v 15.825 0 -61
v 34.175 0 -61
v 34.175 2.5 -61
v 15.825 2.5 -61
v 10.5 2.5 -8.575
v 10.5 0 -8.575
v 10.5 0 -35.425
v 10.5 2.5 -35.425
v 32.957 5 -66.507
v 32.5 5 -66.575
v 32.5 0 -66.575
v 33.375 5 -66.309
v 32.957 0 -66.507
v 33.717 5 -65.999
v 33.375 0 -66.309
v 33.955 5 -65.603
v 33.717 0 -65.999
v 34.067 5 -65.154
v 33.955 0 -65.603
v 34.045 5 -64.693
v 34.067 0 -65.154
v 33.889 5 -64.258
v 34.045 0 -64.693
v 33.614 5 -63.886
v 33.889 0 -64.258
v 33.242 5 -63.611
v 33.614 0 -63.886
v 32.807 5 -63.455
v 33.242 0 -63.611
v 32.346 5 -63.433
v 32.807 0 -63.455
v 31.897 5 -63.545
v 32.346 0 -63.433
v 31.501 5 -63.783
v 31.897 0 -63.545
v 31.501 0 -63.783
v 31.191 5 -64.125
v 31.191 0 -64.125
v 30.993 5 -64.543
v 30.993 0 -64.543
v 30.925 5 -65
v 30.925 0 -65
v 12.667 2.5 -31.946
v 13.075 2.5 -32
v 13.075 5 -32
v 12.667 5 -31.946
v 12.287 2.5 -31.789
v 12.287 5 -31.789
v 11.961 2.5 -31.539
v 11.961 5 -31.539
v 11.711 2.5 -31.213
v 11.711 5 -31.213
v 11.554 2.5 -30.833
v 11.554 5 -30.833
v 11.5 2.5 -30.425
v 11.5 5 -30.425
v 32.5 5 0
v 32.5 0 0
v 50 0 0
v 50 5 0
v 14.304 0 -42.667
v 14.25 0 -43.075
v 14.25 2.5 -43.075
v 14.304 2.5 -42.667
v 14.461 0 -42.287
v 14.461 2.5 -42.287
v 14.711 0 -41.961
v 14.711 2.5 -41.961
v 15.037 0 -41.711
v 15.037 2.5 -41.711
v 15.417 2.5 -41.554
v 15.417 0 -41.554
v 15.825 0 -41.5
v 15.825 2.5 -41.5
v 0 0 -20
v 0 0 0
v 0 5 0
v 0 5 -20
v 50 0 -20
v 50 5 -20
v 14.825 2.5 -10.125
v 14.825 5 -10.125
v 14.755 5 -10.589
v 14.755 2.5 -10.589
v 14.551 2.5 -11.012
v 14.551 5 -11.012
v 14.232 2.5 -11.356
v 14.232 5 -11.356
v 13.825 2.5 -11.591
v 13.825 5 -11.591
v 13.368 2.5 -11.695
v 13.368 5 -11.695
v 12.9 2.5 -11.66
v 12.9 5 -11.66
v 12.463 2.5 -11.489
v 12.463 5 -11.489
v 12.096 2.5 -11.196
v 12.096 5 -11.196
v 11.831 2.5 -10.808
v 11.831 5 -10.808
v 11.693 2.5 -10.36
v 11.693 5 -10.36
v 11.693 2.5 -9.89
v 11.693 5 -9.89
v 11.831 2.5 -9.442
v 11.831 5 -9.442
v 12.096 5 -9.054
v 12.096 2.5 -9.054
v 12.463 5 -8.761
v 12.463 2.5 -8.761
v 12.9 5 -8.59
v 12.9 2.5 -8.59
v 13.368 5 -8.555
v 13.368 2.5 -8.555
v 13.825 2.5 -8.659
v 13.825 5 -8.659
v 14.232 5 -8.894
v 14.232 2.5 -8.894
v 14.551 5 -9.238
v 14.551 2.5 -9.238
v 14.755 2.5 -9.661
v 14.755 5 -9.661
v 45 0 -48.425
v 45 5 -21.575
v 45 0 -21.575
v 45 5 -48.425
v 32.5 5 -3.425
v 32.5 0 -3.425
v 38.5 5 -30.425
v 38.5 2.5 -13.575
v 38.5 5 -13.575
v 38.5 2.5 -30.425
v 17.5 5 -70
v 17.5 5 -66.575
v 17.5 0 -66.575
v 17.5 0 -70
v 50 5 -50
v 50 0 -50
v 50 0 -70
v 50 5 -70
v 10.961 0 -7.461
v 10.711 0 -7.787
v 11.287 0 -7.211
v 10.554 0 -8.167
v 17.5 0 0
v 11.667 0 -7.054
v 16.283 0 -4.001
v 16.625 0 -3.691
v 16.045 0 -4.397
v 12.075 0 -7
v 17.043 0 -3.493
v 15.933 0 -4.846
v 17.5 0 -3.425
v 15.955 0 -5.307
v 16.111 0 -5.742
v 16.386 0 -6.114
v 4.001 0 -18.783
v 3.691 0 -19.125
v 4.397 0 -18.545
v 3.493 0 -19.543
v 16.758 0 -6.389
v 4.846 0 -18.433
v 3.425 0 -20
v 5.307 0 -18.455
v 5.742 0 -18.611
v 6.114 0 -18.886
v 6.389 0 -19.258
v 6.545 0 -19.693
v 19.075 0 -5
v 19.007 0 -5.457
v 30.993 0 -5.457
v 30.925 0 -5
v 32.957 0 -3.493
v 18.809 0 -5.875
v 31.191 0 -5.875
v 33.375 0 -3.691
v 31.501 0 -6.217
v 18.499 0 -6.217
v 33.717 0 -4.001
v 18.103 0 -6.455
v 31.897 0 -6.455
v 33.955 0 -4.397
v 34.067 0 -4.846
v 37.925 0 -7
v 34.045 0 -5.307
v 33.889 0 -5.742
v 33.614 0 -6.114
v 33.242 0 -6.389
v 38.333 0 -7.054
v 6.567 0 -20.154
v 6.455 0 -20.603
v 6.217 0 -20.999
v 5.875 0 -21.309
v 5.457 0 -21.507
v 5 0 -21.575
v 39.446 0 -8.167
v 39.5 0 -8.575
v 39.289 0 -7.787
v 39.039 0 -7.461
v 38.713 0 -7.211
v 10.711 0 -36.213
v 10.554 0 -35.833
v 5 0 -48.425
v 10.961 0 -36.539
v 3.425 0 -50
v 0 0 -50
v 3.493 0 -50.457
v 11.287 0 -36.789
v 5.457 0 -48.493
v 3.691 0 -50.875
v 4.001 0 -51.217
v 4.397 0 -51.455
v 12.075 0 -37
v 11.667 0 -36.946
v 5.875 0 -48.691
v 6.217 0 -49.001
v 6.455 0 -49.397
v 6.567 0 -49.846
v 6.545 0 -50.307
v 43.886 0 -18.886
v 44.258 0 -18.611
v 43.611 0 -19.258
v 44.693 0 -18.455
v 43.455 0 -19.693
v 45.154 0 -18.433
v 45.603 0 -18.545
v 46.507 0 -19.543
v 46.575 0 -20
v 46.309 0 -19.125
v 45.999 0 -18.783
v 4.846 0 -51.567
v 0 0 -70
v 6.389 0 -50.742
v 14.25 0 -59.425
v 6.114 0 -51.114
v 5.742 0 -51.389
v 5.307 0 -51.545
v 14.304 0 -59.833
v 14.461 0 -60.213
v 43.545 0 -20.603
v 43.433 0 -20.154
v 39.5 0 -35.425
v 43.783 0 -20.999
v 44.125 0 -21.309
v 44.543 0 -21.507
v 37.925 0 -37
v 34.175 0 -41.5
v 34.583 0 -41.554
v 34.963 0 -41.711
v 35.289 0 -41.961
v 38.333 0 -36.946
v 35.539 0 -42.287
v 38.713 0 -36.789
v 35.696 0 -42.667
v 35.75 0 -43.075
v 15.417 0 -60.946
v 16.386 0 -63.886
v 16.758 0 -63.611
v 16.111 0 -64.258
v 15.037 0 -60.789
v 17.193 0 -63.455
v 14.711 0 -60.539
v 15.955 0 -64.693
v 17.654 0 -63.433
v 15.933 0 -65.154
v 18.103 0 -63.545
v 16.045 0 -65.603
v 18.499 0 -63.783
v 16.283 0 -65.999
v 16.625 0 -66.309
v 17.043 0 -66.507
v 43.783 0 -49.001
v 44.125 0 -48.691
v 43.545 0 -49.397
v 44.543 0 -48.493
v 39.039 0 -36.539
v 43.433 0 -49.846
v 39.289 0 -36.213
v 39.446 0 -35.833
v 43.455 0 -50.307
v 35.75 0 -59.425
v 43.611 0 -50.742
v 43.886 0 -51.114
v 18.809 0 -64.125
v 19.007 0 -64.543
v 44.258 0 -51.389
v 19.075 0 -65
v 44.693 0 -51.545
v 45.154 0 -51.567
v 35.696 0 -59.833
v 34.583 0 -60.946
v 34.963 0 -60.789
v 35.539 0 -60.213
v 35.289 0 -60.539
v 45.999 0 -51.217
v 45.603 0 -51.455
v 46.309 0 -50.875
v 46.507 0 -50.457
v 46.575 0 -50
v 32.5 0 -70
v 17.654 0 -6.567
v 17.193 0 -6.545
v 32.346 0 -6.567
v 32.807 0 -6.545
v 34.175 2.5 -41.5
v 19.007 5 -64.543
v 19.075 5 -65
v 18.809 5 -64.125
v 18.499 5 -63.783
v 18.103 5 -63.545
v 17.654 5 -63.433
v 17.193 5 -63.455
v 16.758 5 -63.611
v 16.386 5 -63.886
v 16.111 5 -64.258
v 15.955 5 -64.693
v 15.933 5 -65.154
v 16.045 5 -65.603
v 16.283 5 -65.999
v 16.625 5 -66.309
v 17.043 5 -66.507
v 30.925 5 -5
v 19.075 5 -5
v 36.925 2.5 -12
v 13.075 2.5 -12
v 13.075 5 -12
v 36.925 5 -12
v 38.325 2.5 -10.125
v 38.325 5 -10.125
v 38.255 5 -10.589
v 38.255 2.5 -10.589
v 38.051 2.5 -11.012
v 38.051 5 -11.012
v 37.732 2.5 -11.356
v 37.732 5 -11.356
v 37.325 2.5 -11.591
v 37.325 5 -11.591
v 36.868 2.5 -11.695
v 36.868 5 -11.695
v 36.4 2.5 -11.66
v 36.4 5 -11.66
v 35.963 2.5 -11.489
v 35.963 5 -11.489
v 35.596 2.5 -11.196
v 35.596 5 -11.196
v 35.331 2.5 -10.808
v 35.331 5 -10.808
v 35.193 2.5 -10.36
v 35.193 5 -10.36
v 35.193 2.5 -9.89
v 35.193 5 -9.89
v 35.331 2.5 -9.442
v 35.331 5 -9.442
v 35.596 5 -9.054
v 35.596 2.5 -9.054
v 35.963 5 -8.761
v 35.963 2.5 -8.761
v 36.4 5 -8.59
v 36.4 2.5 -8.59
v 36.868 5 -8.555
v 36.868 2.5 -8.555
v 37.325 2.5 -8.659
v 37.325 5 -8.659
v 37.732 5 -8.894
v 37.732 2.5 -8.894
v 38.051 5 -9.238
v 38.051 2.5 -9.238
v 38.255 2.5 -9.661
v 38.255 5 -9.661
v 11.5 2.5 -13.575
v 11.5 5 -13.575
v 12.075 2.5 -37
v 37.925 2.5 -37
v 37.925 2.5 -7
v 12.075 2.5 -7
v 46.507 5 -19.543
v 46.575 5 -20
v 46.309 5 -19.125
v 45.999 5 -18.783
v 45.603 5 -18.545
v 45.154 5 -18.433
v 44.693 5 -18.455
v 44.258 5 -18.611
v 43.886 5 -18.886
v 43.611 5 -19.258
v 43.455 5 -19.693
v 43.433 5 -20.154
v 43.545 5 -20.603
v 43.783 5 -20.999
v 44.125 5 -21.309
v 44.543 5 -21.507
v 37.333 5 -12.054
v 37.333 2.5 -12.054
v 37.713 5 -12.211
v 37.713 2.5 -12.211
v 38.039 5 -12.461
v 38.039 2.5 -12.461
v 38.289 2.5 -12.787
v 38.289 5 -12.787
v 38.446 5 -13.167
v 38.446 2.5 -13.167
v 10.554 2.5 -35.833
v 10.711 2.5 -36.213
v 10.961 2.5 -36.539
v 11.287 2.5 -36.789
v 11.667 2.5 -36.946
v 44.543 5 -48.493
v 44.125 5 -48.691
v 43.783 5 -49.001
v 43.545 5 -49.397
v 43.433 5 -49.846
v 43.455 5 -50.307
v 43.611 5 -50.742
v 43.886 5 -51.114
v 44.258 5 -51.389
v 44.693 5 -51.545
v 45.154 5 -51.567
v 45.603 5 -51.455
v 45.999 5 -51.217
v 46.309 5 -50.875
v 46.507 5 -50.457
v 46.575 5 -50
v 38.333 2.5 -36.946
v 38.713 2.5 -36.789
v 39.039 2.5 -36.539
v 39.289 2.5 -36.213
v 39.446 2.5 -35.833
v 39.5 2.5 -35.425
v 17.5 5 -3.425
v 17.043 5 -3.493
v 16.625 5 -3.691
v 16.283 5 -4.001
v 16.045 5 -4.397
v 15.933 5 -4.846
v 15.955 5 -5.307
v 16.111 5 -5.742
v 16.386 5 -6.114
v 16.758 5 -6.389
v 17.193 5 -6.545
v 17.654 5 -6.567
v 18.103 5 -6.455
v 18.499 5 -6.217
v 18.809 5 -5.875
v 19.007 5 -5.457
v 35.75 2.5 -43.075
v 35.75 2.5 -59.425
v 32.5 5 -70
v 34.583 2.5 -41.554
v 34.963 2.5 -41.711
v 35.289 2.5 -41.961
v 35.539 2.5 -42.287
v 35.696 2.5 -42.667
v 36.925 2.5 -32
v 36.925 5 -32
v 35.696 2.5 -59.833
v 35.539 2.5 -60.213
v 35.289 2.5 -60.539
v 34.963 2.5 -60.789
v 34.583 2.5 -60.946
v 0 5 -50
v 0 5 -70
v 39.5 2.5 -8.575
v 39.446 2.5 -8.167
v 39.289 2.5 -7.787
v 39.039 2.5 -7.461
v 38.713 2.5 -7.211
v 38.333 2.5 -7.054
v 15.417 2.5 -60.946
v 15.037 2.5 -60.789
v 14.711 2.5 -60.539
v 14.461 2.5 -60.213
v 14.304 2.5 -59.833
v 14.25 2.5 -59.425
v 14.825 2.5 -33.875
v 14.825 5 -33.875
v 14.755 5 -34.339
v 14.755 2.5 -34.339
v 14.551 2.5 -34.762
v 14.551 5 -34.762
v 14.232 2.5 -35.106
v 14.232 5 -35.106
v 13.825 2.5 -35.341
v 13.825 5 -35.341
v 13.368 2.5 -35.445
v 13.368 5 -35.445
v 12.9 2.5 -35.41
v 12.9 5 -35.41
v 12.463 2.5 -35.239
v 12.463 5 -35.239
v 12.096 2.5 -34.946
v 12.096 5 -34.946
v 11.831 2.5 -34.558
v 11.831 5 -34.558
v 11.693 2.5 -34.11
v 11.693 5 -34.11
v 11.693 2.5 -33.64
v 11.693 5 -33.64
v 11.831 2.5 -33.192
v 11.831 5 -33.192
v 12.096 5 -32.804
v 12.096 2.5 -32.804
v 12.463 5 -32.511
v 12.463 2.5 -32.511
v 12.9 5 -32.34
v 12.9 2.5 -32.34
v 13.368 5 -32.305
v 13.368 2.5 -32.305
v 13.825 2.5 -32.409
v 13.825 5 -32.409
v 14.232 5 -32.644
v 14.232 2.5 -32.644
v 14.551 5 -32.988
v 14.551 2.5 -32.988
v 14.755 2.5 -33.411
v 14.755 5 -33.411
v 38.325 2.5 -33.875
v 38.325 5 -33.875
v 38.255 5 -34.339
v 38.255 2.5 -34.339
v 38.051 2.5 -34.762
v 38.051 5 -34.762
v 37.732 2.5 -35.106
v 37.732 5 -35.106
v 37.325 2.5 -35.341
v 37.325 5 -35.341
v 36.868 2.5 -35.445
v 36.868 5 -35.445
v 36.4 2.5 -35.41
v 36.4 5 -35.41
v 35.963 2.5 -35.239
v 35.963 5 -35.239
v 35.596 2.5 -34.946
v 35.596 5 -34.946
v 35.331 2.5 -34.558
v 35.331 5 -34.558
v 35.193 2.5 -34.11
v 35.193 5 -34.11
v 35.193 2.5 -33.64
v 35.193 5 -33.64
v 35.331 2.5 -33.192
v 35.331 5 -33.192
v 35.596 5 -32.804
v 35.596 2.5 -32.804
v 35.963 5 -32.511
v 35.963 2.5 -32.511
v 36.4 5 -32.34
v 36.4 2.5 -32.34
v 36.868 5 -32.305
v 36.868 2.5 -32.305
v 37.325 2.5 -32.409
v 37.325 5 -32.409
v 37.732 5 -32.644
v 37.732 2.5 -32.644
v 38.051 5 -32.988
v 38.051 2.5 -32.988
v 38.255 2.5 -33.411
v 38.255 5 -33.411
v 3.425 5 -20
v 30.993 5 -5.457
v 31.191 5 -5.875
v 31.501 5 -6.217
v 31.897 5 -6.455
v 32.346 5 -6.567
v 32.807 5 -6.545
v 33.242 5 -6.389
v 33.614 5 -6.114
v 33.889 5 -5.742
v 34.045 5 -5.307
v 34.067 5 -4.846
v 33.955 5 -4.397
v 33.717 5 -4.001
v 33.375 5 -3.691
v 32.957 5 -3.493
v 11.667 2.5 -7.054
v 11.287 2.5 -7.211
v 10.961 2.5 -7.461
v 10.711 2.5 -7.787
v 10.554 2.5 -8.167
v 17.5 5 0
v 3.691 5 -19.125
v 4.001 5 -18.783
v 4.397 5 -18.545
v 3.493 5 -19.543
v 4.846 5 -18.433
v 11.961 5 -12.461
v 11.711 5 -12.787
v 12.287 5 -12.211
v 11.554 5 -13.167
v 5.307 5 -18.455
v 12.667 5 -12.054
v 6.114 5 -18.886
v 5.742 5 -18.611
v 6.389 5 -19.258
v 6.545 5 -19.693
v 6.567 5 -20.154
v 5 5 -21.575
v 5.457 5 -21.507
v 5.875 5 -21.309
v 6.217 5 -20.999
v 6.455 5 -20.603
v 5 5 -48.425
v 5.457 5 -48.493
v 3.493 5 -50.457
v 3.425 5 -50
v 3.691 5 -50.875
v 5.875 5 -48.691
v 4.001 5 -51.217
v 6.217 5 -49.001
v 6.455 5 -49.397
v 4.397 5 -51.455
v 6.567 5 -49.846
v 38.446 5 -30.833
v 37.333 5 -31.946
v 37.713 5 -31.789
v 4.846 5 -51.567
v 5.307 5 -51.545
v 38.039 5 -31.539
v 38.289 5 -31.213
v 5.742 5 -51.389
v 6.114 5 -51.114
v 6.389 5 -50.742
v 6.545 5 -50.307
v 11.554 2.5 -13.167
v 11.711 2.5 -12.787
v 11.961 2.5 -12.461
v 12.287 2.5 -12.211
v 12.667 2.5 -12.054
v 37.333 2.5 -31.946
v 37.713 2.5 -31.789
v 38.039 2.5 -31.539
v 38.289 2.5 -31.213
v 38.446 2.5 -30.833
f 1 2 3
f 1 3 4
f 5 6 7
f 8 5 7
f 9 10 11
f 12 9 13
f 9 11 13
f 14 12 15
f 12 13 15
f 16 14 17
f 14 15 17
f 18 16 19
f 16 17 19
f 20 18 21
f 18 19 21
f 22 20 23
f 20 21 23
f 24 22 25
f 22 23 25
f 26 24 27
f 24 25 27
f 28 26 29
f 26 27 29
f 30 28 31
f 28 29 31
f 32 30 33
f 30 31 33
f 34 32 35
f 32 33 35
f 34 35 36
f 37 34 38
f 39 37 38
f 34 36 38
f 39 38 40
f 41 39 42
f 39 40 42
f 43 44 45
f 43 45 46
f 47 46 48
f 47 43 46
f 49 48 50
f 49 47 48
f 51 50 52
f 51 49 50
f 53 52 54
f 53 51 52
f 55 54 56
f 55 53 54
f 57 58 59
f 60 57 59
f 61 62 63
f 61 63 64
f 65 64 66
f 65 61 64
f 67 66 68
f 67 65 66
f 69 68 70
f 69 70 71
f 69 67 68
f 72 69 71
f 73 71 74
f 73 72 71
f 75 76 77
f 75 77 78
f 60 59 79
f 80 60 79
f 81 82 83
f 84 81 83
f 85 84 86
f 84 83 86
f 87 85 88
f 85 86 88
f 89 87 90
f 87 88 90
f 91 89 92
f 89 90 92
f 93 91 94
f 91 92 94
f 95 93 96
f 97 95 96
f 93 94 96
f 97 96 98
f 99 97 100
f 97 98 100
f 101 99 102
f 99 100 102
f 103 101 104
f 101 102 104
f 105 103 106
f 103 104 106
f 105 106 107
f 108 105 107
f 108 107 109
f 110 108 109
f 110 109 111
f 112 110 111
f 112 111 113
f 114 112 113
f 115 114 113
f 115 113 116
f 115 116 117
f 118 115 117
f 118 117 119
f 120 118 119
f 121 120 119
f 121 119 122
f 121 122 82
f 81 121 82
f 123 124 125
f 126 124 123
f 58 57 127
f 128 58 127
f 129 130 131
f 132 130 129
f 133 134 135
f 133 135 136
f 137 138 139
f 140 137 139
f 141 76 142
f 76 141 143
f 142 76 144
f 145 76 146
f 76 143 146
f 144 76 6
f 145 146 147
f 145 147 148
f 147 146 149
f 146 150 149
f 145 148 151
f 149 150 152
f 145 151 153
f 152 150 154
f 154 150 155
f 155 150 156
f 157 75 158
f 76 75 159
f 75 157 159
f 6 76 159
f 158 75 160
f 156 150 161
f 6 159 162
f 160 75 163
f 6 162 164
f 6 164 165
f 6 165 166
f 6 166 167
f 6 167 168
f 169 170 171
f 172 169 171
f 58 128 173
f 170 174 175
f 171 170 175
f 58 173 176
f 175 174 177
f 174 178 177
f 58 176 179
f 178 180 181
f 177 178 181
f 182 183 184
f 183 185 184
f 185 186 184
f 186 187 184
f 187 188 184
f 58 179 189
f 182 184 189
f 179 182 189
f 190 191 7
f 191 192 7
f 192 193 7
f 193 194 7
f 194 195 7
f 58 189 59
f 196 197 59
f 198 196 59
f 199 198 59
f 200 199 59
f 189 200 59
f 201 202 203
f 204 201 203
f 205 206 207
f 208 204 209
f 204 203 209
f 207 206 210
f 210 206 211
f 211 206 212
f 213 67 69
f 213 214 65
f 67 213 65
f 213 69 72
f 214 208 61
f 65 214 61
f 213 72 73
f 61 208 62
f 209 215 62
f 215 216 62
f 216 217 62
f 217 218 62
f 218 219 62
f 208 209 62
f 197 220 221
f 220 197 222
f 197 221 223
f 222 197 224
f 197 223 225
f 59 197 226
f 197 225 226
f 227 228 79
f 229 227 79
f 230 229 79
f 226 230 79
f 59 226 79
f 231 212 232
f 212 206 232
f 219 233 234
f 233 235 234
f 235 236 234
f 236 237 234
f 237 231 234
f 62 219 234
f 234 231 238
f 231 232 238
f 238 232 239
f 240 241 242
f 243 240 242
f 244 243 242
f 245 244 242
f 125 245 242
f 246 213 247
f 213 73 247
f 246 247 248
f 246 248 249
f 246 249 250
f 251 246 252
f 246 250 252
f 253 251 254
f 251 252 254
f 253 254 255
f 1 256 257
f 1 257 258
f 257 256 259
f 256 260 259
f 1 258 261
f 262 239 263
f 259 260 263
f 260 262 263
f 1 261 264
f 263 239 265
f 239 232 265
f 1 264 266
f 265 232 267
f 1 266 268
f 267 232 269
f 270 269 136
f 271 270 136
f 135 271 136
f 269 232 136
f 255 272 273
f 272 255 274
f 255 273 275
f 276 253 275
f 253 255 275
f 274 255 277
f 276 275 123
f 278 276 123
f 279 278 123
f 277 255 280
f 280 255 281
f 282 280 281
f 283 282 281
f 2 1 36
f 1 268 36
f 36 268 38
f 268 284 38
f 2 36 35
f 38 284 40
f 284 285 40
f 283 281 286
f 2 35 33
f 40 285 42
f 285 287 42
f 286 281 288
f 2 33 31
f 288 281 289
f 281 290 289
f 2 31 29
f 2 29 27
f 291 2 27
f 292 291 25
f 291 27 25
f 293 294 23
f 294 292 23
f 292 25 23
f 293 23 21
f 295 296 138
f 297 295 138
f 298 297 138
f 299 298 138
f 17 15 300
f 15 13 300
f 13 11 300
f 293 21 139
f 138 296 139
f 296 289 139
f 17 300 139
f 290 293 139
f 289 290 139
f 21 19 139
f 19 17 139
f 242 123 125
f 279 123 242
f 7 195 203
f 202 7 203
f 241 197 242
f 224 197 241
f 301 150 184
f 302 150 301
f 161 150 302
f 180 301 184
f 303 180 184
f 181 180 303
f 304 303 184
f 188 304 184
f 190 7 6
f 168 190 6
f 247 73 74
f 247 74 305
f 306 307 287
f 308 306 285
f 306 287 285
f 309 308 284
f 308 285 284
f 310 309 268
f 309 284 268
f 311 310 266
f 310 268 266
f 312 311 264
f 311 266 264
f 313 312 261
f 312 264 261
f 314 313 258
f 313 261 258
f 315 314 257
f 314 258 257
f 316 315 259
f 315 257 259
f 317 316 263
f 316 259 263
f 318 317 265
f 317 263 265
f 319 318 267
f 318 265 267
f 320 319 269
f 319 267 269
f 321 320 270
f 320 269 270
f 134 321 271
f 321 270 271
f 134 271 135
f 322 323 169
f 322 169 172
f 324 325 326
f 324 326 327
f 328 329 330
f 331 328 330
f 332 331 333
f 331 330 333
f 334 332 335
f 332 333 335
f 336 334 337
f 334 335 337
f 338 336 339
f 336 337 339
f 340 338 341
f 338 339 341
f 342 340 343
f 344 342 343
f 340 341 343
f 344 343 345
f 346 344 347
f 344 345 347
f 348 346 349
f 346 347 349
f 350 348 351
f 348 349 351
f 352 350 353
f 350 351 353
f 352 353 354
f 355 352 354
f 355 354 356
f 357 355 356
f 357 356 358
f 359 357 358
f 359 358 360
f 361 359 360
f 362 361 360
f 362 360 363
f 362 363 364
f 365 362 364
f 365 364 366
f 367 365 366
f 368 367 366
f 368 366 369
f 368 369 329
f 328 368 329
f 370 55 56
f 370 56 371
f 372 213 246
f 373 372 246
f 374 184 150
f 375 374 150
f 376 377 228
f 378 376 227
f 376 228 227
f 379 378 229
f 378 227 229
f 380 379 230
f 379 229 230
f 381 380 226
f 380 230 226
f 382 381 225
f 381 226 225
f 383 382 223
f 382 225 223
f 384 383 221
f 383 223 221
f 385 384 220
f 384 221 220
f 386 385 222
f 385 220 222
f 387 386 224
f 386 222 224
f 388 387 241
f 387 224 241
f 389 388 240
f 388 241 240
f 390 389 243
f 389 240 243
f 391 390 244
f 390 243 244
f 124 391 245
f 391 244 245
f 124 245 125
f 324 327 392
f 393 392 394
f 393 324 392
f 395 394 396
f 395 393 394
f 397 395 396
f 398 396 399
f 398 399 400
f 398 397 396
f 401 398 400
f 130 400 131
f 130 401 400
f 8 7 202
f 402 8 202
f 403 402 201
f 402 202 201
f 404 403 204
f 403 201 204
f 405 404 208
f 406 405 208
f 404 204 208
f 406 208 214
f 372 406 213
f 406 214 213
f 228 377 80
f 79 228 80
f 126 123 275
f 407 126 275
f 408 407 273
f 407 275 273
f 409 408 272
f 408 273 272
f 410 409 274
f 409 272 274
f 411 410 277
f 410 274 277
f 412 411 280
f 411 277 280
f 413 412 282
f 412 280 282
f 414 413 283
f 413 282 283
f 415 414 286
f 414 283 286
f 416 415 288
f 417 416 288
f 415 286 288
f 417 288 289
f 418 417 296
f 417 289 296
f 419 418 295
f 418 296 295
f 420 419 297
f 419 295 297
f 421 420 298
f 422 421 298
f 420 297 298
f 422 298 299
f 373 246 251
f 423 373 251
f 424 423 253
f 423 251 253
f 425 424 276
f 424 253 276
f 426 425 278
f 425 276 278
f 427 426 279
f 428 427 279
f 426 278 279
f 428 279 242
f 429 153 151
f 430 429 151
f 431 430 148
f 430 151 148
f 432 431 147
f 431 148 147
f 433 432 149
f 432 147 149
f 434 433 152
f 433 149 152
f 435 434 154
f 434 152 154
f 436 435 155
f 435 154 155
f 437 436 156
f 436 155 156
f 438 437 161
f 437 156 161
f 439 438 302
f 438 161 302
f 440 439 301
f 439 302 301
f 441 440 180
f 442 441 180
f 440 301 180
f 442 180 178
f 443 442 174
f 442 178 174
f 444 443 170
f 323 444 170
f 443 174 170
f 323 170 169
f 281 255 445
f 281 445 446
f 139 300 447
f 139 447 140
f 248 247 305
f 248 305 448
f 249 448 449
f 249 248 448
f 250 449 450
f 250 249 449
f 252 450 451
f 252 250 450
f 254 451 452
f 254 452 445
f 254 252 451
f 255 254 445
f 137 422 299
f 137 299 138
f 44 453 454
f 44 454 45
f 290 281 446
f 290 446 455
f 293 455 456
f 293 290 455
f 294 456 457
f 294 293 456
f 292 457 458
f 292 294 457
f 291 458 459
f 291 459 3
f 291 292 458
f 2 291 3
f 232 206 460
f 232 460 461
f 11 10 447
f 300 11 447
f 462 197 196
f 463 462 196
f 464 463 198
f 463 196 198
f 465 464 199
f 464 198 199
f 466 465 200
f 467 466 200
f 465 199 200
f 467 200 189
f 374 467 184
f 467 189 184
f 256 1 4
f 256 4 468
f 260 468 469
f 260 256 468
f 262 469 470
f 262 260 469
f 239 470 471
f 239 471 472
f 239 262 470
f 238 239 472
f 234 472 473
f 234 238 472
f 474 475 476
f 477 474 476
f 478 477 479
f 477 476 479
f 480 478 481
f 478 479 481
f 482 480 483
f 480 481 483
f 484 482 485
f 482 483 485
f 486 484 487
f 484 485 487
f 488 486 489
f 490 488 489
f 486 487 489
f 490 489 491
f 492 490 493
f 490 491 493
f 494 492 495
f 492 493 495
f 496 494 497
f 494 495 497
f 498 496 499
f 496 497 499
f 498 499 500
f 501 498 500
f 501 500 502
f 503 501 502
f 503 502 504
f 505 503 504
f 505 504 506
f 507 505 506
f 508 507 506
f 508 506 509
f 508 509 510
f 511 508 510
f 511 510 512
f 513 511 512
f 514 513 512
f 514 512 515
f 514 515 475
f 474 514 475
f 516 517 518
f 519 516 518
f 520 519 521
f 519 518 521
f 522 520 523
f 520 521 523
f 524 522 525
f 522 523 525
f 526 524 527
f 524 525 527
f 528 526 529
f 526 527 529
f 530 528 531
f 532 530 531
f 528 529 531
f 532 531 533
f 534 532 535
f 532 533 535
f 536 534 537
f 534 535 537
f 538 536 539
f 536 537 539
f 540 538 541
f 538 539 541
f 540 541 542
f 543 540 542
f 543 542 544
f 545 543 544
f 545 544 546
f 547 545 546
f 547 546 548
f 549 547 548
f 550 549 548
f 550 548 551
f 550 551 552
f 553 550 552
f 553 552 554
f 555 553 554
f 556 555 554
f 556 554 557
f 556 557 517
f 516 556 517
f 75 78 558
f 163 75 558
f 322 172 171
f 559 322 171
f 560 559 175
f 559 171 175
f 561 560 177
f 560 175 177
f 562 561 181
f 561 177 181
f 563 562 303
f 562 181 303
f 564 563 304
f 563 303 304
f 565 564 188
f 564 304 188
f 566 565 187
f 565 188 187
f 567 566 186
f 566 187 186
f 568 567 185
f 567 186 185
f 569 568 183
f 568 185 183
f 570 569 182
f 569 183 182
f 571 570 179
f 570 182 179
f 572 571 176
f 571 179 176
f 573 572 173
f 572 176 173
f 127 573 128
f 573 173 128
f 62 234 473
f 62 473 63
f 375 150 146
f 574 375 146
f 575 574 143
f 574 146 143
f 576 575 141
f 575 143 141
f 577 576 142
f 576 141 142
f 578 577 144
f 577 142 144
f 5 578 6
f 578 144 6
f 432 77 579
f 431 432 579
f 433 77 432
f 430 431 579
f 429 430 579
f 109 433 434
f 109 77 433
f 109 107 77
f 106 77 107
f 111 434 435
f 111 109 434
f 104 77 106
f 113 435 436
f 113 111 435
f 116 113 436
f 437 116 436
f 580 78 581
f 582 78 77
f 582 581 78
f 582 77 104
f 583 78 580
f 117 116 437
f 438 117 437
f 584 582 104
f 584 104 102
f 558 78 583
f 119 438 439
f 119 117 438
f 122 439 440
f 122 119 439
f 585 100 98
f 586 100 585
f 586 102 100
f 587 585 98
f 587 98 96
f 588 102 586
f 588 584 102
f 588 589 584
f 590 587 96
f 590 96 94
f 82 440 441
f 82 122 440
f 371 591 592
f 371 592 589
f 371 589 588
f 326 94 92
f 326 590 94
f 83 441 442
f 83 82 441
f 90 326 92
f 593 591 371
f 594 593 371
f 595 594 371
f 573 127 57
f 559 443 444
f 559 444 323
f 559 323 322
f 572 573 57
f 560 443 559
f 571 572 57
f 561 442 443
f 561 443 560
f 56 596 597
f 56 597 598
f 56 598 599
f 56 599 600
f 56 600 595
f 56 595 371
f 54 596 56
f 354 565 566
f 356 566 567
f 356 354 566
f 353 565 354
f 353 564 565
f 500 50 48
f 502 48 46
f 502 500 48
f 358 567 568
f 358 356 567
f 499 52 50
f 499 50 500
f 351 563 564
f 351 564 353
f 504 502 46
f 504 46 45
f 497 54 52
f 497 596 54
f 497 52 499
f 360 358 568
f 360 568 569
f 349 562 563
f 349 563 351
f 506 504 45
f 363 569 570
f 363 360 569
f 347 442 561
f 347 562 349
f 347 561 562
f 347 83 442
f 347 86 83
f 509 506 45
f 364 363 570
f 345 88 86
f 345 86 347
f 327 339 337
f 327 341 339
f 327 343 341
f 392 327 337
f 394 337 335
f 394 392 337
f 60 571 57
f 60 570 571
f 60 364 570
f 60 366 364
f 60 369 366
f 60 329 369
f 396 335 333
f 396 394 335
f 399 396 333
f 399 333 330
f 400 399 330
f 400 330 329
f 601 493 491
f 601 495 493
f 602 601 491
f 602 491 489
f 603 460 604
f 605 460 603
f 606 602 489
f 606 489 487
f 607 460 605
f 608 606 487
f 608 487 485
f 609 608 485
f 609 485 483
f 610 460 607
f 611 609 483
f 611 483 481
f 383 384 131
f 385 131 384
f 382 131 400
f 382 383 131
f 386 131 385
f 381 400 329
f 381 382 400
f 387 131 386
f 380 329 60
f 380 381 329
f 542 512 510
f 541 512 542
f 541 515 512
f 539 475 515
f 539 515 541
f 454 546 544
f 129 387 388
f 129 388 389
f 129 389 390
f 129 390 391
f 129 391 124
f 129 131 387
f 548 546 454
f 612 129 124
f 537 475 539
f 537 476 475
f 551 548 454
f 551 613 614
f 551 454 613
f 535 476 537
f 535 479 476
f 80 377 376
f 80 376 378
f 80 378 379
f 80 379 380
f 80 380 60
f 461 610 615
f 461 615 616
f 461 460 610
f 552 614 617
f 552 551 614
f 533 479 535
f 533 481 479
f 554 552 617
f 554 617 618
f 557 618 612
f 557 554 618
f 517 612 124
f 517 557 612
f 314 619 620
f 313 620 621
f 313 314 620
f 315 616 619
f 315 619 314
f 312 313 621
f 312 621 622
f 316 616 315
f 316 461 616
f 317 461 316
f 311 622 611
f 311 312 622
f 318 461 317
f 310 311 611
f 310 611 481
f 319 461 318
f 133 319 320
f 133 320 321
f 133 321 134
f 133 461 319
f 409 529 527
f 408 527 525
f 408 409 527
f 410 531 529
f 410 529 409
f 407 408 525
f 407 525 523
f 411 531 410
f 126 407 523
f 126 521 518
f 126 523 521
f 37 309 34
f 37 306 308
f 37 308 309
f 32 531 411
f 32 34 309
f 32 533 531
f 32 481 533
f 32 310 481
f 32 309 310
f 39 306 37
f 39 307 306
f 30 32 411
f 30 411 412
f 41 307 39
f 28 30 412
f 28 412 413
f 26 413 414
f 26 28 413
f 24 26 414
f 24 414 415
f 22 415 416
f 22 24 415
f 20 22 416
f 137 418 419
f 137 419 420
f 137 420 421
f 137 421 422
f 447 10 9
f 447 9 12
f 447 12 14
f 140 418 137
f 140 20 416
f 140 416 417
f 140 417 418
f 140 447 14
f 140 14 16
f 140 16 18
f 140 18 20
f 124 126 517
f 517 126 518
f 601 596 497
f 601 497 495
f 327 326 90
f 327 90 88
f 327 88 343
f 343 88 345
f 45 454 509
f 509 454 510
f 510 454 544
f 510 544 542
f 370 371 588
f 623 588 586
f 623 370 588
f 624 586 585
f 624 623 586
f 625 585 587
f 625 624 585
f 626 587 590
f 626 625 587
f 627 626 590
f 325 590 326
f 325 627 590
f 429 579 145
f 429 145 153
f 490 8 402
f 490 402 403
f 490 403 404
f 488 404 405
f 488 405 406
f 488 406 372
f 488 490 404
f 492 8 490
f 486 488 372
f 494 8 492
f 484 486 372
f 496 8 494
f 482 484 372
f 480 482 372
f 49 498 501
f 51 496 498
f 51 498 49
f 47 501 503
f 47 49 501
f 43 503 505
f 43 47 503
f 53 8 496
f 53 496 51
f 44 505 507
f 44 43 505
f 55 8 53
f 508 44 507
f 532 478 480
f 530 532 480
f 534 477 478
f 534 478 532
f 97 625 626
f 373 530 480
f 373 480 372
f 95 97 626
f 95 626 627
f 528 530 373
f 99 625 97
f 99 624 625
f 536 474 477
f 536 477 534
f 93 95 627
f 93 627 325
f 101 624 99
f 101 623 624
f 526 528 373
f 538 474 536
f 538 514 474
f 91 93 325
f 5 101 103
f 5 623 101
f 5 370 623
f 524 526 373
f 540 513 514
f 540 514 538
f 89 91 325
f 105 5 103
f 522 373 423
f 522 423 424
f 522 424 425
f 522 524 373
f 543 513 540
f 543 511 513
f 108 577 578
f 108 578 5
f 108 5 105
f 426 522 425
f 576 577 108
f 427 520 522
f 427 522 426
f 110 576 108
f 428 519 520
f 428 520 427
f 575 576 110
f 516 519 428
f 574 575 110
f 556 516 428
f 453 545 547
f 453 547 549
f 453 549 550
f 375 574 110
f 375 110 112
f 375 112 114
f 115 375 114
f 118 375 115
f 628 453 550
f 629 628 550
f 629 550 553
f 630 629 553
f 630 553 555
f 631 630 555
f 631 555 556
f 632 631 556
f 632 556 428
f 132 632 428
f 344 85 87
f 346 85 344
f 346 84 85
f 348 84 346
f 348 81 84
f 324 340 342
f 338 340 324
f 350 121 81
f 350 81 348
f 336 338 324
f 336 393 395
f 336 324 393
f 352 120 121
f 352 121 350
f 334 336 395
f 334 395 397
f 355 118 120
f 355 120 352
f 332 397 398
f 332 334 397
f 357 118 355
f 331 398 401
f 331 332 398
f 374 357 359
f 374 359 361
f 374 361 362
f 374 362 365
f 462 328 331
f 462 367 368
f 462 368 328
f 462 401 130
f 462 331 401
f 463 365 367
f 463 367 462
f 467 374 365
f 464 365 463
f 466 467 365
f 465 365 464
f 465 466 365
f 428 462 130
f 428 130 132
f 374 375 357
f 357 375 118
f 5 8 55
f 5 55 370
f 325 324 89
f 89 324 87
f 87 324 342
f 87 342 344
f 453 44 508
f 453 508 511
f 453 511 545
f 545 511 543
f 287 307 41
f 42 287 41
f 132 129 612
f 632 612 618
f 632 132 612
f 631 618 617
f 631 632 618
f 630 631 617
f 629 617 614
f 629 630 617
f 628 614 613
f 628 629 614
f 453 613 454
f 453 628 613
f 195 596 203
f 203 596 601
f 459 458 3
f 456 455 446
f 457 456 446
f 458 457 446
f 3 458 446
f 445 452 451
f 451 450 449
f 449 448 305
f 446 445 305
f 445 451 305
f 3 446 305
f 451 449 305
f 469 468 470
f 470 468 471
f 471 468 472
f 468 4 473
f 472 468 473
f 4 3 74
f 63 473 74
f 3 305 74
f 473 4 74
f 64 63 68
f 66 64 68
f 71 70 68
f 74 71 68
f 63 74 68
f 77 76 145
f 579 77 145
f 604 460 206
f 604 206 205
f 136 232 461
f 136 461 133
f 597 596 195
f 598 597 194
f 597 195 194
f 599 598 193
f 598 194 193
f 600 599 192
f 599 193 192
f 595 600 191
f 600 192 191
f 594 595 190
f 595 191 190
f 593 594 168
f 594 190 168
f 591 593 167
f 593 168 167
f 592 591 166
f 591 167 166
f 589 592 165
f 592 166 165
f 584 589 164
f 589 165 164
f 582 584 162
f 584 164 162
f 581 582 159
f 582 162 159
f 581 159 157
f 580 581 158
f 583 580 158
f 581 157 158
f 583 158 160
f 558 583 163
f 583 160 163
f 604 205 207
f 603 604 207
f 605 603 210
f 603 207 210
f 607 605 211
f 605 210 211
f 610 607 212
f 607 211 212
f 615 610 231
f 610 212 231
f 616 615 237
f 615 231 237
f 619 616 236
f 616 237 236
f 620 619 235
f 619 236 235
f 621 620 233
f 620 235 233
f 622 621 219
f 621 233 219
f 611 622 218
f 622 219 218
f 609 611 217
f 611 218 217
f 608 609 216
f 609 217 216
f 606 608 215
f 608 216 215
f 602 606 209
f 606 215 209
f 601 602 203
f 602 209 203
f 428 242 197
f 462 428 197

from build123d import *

# Parameters (mm, degrees)
SKETCH1_W               = 50
SKETCH1_H               = 70
BOSS_EXTRUDE1_DEPTH     = 5
CUT_EXTRUDE1_DEPTH      = 2.5
SKETCH3_R               = 1.57480315
CUT_EXTRUDE5_DEPTH      = 6
CUT_EXTRUDE2_DEPTH      = 2.5
SKETCH5_W               = 5
SKETCH5_H               = 30
SKETCH5_W_2             = 15
SKETCH5_H_2             = 5
CUT_EXTRUDE3_DEPTH      = 1
CUT_EXTRUDE3_DEPTH_BACK = 6
SKETCH6_R               = 1.57480315
CUT_EXTRUDE4_DEPTH      = 6


with BuildPart() as part:
    # Sketch1 → Boss-Extrude1 (new body)
    with BuildSketch(Plane(origin=(0, 0, 0), x_dir=(1, 0, 0), z_dir=(0, 1, 0))):
        with Locations((25, 35)):
            Rectangle(SKETCH1_W, SKETCH1_H)
        with BuildLine():
            Line((13.07480315, 12), (36.92519685, 12))
            ThreePointArc((36.92519685, 12), (38.038750837, 12.461249163), (38.5, 13.57480315))
            Line((38.5, 13.57480315), (38.5, 30.42519685))
            ThreePointArc((38.5, 30.42519685), (38.038750837, 31.538750837), (36.92519685, 32))
            Line((36.92519685, 32), (13.07480315, 32))
            ThreePointArc((13.07480315, 32), (11.961249163, 31.538750837), (11.5, 30.42519685))
            Line((11.5, 30.42519685), (11.5, 13.57480315))
            ThreePointArc((11.5, 13.57480315), (11.961249163, 12.461249163), (13.07480315, 12))
        make_face(mode=Mode.SUBTRACT)
    extrude(amount=BOSS_EXTRUDE1_DEPTH)

    # Sketch2 → Cut-Extrude1 (cut)
    with BuildSketch(Plane.XZ):
        with BuildLine():
            Line((12.07480315, -37), (37.92519685, -37))
            ThreePointArc((37.92519685, -37), (39.038750837, -36.538750837), (39.5, -35.42519685))
            Line((39.5, -35.42519685), (39.5, -8.57480315))
            ThreePointArc((39.5, -8.57480315), (39.038750837, -7.461249163), (37.92519685, -7))
            Line((37.92519685, -7), (12.07480315, -7))
            ThreePointArc((12.07480315, -7), (10.961249163, -7.461249163), (10.5, -8.57480315))
            Line((10.5, -8.57480315), (10.5, -35.42519685))
            ThreePointArc((10.5, -35.42519685), (10.961249163, -36.538750837), (12.07480315, -37))
        make_face()
    extrude(amount=-CUT_EXTRUDE1_DEPTH, mode=Mode.SUBTRACT)

    # Sketch3 → Cut-Extrude5 (cut, through all)
    with BuildSketch(Plane(origin=(0, 5, 0), x_dir=(1, 0, 0), z_dir=(0, 1, 0))):
        with Locations((13.25, 33.875)):
            Circle(SKETCH3_R)
        with Locations((36.75, 33.875)):
            Circle(SKETCH3_R)
        with Locations((36.75, 10.125)):
            Circle(SKETCH3_R)
        with Locations((13.25, 10.125)):
            Circle(SKETCH3_R)
    extrude(amount=-CUT_EXTRUDE5_DEPTH, mode=Mode.SUBTRACT)

    # Sketch4 → Cut-Extrude2 (cut)
    with BuildSketch(Plane.XZ):
        with BuildLine():
            Line((34.17519685, -61), (15.82480315, -61))
            ThreePointArc((15.82480315, -61), (14.711249163, -60.538750837), (14.25, -59.42519685))
            Line((14.25, -59.42519685), (14.25, -43.07480315))
            ThreePointArc((14.25, -43.07480315), (14.711249163, -41.961249163), (15.82480315, -41.5))
            Line((15.82480315, -41.5), (34.17519685, -41.5))
            ThreePointArc((34.17519685, -41.5), (35.288750837, -41.961249163), (35.75, -43.07480315))
            Line((35.75, -43.07480315), (35.75, -59.42519685))
            ThreePointArc((35.75, -59.42519685), (35.288750837, -60.538750837), (34.17519685, -61))
        make_face()
    extrude(amount=-CUT_EXTRUDE2_DEPTH, mode=Mode.SUBTRACT)

    # Sketch5 → Cut-Extrude3 (cut, two sides)
    with BuildSketch(Plane(origin=(0, 5, 0), x_dir=(1, 0, 0), z_dir=(0, 1, 0))) as cut_extrude3_sk:
        with Locations((2.5, 35)):
            Rectangle(SKETCH5_W, SKETCH5_H)
        with Locations((25, 67.5)):
            Rectangle(SKETCH5_W_2, SKETCH5_H_2)
        with Locations((47.5, 35)):
            Rectangle(SKETCH5_W, SKETCH5_H)
        with Locations((25, 2.5)):
            Rectangle(SKETCH5_W_2, SKETCH5_H_2)
    extrude(amount=CUT_EXTRUDE3_DEPTH, mode=Mode.SUBTRACT)
    extrude(cut_extrude3_sk.sketch, amount=-CUT_EXTRUDE3_DEPTH_BACK, mode=Mode.SUBTRACT)

    # Sketch6 → Cut-Extrude4 (cut, through all)
    with BuildSketch(Plane.XZ):
        with Locations((5, -50)):
            Circle(SKETCH6_R)
        with Locations((5, -20)):
            Circle(SKETCH6_R)
        with Locations((17.5, -5)):
            Circle(SKETCH6_R)
        with Locations((32.5, -5)):
            Circle(SKETCH6_R)
        with Locations((45, -20)):
            Circle(SKETCH6_R)
        with Locations((45, -50)):
            Circle(SKETCH6_R)
        with Locations((32.5, -65)):
            Circle(SKETCH6_R)
        with Locations((17.5, -65)):
            Circle(SKETCH6_R)
    extrude(amount=-CUT_EXTRUDE4_DEPTH, mode=Mode.SUBTRACT)


solid = part.part
